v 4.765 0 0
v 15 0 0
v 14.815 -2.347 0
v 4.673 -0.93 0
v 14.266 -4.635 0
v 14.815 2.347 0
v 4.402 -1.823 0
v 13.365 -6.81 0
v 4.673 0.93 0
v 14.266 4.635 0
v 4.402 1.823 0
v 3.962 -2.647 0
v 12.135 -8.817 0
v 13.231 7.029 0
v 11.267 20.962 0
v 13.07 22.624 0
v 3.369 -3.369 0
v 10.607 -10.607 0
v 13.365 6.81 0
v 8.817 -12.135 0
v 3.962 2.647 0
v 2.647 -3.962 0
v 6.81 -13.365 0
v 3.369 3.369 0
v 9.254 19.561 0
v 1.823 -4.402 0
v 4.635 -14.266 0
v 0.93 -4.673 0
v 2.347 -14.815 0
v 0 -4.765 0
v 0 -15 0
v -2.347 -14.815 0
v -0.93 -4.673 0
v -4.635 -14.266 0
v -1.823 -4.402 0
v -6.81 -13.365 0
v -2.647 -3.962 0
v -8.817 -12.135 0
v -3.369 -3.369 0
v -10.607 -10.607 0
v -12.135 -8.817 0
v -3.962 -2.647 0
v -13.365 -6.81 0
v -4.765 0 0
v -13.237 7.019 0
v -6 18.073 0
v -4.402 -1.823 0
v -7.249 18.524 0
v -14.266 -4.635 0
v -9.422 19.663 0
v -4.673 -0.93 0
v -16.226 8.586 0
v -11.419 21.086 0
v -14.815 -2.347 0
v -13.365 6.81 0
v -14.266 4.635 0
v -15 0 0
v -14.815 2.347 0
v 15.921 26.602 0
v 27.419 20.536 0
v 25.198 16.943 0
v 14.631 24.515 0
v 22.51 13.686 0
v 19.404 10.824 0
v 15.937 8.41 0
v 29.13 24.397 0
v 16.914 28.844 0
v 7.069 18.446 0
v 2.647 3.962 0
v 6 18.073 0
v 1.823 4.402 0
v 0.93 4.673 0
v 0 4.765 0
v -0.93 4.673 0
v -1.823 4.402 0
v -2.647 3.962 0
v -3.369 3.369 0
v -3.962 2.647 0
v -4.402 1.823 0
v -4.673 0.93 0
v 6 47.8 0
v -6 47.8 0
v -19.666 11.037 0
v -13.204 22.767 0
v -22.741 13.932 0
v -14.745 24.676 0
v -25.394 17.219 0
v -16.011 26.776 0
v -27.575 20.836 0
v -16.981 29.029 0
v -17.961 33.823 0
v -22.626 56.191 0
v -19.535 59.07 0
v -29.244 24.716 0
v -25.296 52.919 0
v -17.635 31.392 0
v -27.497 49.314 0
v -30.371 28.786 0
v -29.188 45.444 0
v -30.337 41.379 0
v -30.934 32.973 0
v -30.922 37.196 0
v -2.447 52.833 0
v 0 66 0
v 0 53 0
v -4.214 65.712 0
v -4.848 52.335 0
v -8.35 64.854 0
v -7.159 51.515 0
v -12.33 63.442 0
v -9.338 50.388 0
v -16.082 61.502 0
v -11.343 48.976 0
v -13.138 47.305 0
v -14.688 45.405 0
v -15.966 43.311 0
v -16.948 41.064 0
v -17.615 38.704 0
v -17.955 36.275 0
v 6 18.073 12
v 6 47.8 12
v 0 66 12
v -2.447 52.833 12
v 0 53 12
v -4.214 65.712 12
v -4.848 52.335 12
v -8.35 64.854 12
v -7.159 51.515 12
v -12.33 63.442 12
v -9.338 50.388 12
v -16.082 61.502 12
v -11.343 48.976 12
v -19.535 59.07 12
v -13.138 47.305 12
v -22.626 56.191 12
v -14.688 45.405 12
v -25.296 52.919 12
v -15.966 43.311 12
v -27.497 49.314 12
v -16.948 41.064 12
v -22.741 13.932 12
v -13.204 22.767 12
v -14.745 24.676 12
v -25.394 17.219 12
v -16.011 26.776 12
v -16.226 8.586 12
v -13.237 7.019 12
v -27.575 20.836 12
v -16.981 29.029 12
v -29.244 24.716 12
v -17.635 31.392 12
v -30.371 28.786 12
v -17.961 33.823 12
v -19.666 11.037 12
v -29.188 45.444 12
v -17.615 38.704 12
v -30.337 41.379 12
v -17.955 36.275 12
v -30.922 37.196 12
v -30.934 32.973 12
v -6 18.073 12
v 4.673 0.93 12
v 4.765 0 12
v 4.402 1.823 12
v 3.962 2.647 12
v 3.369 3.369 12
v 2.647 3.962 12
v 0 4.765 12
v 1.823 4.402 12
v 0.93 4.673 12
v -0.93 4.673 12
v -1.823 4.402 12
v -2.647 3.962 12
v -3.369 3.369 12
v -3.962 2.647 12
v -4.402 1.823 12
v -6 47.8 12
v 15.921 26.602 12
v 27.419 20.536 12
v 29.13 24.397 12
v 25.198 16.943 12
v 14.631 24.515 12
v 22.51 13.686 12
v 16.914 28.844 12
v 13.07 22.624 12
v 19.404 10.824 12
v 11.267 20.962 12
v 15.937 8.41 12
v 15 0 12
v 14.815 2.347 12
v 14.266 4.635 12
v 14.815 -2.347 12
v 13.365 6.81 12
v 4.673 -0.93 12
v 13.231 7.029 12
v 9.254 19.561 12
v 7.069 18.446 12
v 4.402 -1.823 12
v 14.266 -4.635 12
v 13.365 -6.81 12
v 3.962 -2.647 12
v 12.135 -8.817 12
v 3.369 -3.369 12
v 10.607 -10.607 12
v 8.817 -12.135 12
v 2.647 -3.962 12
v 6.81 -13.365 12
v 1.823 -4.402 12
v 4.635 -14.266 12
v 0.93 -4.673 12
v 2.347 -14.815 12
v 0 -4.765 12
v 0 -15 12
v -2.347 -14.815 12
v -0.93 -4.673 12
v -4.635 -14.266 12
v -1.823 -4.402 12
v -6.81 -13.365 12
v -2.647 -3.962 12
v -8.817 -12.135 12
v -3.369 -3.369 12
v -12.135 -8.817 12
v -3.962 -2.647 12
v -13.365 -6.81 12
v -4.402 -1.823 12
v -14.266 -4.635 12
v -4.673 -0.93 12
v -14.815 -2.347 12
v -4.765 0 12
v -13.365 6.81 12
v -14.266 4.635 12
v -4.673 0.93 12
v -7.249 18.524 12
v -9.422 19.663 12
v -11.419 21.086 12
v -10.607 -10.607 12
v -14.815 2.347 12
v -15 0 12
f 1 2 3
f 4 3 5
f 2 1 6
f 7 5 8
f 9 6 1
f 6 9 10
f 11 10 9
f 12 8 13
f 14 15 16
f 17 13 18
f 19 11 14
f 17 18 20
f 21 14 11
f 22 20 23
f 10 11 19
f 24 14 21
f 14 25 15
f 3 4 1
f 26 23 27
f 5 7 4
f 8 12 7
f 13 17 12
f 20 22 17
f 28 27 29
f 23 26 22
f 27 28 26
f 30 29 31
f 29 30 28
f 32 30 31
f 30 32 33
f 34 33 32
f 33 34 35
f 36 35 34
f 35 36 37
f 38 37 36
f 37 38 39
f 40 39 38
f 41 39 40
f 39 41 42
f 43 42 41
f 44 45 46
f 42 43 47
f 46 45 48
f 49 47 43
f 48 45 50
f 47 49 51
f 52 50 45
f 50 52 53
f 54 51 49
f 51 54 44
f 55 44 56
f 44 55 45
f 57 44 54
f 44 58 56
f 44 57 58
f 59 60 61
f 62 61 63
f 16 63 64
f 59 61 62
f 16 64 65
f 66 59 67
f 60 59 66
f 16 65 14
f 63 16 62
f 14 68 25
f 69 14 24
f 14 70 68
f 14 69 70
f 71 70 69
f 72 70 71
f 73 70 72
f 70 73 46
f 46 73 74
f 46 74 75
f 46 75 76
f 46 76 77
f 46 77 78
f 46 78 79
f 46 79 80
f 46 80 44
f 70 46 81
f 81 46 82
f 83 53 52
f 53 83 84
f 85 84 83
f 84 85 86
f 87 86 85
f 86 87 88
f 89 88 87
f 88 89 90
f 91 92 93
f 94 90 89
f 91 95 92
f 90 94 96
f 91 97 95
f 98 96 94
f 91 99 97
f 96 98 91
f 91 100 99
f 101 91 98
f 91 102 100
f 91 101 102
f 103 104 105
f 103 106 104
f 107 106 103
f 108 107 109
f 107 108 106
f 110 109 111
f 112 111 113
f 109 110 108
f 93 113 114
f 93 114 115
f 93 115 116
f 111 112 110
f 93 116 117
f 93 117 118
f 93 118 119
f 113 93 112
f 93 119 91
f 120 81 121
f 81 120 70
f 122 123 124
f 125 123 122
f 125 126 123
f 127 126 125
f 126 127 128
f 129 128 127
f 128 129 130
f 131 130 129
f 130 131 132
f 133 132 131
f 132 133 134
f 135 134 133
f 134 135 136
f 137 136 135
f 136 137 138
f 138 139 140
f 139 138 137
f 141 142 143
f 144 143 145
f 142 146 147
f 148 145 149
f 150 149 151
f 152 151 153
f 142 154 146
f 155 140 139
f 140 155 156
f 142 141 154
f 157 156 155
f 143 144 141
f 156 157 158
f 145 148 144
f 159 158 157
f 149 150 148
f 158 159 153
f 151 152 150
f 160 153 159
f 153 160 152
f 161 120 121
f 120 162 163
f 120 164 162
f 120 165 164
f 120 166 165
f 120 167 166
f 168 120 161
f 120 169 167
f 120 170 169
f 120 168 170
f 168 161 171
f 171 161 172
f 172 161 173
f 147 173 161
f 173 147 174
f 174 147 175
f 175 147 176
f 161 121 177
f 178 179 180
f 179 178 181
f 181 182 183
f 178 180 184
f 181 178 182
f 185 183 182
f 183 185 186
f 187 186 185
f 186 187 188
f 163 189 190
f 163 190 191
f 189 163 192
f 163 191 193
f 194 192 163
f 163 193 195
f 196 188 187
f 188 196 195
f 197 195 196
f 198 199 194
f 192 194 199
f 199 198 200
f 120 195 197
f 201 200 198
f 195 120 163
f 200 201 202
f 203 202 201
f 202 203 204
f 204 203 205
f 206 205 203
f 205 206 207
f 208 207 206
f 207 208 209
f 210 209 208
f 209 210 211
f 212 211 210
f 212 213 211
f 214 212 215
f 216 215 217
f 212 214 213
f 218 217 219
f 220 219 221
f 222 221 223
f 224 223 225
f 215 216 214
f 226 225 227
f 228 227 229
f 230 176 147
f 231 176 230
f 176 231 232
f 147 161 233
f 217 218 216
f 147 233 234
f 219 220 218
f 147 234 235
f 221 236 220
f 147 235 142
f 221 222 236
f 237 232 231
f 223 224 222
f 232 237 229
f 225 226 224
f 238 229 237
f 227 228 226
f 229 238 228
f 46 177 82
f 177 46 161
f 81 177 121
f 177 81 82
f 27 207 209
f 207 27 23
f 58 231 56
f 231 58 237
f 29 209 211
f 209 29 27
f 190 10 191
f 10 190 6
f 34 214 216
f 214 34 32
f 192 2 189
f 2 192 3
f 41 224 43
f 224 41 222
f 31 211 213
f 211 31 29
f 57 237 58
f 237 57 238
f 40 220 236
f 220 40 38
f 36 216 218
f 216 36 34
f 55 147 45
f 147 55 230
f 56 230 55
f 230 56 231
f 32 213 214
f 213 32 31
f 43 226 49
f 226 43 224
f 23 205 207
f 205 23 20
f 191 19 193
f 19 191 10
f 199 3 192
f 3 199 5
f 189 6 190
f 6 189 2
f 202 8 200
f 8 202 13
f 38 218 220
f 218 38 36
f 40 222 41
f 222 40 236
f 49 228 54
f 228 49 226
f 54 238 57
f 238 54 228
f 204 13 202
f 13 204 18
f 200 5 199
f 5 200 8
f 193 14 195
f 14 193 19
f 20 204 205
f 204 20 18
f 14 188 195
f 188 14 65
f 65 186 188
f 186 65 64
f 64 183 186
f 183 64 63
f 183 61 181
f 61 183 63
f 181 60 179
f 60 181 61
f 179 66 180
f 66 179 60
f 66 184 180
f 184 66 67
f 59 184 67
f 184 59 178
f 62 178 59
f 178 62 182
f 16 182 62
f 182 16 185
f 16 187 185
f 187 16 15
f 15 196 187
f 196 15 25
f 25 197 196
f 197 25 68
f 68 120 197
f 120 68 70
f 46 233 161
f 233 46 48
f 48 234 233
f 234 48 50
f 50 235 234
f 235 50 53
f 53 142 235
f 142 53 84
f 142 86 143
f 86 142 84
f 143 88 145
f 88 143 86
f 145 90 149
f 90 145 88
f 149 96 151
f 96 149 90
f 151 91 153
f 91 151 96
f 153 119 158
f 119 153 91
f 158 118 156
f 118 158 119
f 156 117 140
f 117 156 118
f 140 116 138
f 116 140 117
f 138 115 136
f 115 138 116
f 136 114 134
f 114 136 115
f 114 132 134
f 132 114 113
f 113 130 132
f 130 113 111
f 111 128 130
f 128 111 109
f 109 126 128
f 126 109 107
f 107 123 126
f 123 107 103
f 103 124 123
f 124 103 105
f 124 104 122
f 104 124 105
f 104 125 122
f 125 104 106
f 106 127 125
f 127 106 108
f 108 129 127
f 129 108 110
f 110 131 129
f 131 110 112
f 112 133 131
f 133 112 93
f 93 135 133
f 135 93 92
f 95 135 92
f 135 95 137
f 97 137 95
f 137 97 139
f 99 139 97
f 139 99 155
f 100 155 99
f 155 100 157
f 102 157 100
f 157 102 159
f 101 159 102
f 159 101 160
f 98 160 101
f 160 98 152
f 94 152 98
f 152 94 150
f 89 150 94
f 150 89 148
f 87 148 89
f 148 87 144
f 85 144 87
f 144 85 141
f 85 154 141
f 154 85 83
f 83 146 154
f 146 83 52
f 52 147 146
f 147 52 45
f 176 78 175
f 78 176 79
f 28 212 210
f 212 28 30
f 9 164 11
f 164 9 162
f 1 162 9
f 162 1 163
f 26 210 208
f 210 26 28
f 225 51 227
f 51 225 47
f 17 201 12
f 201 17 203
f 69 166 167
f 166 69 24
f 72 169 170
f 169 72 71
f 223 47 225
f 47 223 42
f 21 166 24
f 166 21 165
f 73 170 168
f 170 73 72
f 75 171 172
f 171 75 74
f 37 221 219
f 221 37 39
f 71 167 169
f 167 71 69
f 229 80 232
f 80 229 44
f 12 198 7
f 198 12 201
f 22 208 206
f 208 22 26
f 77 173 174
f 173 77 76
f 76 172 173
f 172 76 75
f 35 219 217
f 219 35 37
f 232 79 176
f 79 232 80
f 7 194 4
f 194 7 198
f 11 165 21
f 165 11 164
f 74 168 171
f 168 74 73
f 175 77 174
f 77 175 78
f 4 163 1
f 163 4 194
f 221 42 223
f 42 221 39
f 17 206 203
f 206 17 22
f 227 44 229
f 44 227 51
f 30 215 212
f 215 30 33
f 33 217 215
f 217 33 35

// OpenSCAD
$fn = 32;

// ----------------------------------------------------------------------
// Hook: 70 mm shank into a 18 mm curl, 12 mm thick
// ----------------------------------------------------------------------

// --- parameters (mm) ---
shank_len = 70;           // shank length from the boss centre
shank_w = 12;             // shank width
boss_d = 30;              // boss diameter
bore_d = 9.53;            // boss bore
curl_in = 18;             // curl inner radius
curl_out = 31;            // curl outer radius
curl_sweep = 250;         // curl sweep angle
hook_t = 12;              // hook thickness

shank_profile = [[-6, 47.8], [6, 47.8], [6, 13], [-6, 13]];
boss_profile = [[15, 0], [14.815, 2.347], [14.266, 4.635], [13.365, 6.81], [12.135, 8.817], [10.607, 10.607], [8.817, 12.135], [6.81, 13.365], [4.635, 14.266], [2.347, 14.815], [0, 15], [-2.347, 14.815], [-4.635, 14.266], [-6.81, 13.365], [-8.817, 12.135], [-10.607, 10.607], [-12.135, 8.817], [-13.365, 6.81], [-14.266, 4.635], [-14.815, 2.347], [-15, 0], [-14.815, -2.347], [-14.266, -4.635], [-13.365, -6.81], [-12.135, -8.817], [-10.607, -10.607], [-8.817, -12.135], [-6.81, -13.365], [-4.635, -14.266], [-2.347, -14.815], [0, -15], [2.347, -14.815], [4.635, -14.266], [6.81, -13.365], [8.817, -12.135], [10.607, -10.607], [12.135, -8.817], [13.365, -6.81], [14.266, -4.635], [14.815, -2.347]];
curl_profile = [[0, 66], [-4.214, 65.712], [-8.35, 64.854], [-12.33, 63.442], [-16.082, 61.502], [-19.535, 59.07], [-22.626, 56.191], [-25.296, 52.919], [-27.497, 49.314], [-29.188, 45.444], [-30.337, 41.379], [-30.922, 37.196], [-30.934, 32.973], [-30.371, 28.786], [-29.244, 24.716], [-27.575, 20.836], [-25.394, 17.219], [-22.741, 13.932], [-19.666, 11.037], [-16.226, 8.586], [-12.485, 6.625], [-8.512, 5.192], [-4.381, 4.311], [-0.169, 4], [4.046, 4.265], [8.187, 5.101], [12.175, 6.491], [15.937, 8.41], [19.404, 10.824], [22.51, 13.686], [25.198, 16.943], [27.419, 20.536], [29.13, 24.397], [16.914, 28.844], [15.921, 26.602], [14.631, 24.515], [13.07, 22.624], [11.267, 20.962], [9.254, 19.561], [7.069, 18.446], [4.754, 17.639], [2.349, 17.154], [-0.098, 17], [-2.544, 17.181], [-4.943, 17.692], [-7.249, 18.524], [-9.422, 19.663], [-11.419, 21.086], [-13.204, 22.767], [-14.745, 24.676], [-16.011, 26.776], [-16.981, 29.029], [-17.635, 31.392], [-17.961, 33.823], [-17.955, 36.275], [-17.615, 38.704], [-16.948, 41.064], [-15.966, 43.311], [-14.688, 45.405], [-13.138, 47.305], [-11.343, 48.976], [-9.338, 50.388], [-7.159, 51.515], [-4.848, 52.335], [-2.447, 52.833], [0, 53]];

difference() {
  union() {
    /* three overlapping outlines: shank, boss and the smooth curl */
    linear_extrude(height = hook_t) polygon(shank_profile);
    linear_extrude(height = hook_t) polygon(boss_profile);
    linear_extrude(height = hook_t) polygon(curl_profile);
  }
  translate([0, 0, -2.5]) cylinder(h = hook_t + 5, d = bore_d);
}
